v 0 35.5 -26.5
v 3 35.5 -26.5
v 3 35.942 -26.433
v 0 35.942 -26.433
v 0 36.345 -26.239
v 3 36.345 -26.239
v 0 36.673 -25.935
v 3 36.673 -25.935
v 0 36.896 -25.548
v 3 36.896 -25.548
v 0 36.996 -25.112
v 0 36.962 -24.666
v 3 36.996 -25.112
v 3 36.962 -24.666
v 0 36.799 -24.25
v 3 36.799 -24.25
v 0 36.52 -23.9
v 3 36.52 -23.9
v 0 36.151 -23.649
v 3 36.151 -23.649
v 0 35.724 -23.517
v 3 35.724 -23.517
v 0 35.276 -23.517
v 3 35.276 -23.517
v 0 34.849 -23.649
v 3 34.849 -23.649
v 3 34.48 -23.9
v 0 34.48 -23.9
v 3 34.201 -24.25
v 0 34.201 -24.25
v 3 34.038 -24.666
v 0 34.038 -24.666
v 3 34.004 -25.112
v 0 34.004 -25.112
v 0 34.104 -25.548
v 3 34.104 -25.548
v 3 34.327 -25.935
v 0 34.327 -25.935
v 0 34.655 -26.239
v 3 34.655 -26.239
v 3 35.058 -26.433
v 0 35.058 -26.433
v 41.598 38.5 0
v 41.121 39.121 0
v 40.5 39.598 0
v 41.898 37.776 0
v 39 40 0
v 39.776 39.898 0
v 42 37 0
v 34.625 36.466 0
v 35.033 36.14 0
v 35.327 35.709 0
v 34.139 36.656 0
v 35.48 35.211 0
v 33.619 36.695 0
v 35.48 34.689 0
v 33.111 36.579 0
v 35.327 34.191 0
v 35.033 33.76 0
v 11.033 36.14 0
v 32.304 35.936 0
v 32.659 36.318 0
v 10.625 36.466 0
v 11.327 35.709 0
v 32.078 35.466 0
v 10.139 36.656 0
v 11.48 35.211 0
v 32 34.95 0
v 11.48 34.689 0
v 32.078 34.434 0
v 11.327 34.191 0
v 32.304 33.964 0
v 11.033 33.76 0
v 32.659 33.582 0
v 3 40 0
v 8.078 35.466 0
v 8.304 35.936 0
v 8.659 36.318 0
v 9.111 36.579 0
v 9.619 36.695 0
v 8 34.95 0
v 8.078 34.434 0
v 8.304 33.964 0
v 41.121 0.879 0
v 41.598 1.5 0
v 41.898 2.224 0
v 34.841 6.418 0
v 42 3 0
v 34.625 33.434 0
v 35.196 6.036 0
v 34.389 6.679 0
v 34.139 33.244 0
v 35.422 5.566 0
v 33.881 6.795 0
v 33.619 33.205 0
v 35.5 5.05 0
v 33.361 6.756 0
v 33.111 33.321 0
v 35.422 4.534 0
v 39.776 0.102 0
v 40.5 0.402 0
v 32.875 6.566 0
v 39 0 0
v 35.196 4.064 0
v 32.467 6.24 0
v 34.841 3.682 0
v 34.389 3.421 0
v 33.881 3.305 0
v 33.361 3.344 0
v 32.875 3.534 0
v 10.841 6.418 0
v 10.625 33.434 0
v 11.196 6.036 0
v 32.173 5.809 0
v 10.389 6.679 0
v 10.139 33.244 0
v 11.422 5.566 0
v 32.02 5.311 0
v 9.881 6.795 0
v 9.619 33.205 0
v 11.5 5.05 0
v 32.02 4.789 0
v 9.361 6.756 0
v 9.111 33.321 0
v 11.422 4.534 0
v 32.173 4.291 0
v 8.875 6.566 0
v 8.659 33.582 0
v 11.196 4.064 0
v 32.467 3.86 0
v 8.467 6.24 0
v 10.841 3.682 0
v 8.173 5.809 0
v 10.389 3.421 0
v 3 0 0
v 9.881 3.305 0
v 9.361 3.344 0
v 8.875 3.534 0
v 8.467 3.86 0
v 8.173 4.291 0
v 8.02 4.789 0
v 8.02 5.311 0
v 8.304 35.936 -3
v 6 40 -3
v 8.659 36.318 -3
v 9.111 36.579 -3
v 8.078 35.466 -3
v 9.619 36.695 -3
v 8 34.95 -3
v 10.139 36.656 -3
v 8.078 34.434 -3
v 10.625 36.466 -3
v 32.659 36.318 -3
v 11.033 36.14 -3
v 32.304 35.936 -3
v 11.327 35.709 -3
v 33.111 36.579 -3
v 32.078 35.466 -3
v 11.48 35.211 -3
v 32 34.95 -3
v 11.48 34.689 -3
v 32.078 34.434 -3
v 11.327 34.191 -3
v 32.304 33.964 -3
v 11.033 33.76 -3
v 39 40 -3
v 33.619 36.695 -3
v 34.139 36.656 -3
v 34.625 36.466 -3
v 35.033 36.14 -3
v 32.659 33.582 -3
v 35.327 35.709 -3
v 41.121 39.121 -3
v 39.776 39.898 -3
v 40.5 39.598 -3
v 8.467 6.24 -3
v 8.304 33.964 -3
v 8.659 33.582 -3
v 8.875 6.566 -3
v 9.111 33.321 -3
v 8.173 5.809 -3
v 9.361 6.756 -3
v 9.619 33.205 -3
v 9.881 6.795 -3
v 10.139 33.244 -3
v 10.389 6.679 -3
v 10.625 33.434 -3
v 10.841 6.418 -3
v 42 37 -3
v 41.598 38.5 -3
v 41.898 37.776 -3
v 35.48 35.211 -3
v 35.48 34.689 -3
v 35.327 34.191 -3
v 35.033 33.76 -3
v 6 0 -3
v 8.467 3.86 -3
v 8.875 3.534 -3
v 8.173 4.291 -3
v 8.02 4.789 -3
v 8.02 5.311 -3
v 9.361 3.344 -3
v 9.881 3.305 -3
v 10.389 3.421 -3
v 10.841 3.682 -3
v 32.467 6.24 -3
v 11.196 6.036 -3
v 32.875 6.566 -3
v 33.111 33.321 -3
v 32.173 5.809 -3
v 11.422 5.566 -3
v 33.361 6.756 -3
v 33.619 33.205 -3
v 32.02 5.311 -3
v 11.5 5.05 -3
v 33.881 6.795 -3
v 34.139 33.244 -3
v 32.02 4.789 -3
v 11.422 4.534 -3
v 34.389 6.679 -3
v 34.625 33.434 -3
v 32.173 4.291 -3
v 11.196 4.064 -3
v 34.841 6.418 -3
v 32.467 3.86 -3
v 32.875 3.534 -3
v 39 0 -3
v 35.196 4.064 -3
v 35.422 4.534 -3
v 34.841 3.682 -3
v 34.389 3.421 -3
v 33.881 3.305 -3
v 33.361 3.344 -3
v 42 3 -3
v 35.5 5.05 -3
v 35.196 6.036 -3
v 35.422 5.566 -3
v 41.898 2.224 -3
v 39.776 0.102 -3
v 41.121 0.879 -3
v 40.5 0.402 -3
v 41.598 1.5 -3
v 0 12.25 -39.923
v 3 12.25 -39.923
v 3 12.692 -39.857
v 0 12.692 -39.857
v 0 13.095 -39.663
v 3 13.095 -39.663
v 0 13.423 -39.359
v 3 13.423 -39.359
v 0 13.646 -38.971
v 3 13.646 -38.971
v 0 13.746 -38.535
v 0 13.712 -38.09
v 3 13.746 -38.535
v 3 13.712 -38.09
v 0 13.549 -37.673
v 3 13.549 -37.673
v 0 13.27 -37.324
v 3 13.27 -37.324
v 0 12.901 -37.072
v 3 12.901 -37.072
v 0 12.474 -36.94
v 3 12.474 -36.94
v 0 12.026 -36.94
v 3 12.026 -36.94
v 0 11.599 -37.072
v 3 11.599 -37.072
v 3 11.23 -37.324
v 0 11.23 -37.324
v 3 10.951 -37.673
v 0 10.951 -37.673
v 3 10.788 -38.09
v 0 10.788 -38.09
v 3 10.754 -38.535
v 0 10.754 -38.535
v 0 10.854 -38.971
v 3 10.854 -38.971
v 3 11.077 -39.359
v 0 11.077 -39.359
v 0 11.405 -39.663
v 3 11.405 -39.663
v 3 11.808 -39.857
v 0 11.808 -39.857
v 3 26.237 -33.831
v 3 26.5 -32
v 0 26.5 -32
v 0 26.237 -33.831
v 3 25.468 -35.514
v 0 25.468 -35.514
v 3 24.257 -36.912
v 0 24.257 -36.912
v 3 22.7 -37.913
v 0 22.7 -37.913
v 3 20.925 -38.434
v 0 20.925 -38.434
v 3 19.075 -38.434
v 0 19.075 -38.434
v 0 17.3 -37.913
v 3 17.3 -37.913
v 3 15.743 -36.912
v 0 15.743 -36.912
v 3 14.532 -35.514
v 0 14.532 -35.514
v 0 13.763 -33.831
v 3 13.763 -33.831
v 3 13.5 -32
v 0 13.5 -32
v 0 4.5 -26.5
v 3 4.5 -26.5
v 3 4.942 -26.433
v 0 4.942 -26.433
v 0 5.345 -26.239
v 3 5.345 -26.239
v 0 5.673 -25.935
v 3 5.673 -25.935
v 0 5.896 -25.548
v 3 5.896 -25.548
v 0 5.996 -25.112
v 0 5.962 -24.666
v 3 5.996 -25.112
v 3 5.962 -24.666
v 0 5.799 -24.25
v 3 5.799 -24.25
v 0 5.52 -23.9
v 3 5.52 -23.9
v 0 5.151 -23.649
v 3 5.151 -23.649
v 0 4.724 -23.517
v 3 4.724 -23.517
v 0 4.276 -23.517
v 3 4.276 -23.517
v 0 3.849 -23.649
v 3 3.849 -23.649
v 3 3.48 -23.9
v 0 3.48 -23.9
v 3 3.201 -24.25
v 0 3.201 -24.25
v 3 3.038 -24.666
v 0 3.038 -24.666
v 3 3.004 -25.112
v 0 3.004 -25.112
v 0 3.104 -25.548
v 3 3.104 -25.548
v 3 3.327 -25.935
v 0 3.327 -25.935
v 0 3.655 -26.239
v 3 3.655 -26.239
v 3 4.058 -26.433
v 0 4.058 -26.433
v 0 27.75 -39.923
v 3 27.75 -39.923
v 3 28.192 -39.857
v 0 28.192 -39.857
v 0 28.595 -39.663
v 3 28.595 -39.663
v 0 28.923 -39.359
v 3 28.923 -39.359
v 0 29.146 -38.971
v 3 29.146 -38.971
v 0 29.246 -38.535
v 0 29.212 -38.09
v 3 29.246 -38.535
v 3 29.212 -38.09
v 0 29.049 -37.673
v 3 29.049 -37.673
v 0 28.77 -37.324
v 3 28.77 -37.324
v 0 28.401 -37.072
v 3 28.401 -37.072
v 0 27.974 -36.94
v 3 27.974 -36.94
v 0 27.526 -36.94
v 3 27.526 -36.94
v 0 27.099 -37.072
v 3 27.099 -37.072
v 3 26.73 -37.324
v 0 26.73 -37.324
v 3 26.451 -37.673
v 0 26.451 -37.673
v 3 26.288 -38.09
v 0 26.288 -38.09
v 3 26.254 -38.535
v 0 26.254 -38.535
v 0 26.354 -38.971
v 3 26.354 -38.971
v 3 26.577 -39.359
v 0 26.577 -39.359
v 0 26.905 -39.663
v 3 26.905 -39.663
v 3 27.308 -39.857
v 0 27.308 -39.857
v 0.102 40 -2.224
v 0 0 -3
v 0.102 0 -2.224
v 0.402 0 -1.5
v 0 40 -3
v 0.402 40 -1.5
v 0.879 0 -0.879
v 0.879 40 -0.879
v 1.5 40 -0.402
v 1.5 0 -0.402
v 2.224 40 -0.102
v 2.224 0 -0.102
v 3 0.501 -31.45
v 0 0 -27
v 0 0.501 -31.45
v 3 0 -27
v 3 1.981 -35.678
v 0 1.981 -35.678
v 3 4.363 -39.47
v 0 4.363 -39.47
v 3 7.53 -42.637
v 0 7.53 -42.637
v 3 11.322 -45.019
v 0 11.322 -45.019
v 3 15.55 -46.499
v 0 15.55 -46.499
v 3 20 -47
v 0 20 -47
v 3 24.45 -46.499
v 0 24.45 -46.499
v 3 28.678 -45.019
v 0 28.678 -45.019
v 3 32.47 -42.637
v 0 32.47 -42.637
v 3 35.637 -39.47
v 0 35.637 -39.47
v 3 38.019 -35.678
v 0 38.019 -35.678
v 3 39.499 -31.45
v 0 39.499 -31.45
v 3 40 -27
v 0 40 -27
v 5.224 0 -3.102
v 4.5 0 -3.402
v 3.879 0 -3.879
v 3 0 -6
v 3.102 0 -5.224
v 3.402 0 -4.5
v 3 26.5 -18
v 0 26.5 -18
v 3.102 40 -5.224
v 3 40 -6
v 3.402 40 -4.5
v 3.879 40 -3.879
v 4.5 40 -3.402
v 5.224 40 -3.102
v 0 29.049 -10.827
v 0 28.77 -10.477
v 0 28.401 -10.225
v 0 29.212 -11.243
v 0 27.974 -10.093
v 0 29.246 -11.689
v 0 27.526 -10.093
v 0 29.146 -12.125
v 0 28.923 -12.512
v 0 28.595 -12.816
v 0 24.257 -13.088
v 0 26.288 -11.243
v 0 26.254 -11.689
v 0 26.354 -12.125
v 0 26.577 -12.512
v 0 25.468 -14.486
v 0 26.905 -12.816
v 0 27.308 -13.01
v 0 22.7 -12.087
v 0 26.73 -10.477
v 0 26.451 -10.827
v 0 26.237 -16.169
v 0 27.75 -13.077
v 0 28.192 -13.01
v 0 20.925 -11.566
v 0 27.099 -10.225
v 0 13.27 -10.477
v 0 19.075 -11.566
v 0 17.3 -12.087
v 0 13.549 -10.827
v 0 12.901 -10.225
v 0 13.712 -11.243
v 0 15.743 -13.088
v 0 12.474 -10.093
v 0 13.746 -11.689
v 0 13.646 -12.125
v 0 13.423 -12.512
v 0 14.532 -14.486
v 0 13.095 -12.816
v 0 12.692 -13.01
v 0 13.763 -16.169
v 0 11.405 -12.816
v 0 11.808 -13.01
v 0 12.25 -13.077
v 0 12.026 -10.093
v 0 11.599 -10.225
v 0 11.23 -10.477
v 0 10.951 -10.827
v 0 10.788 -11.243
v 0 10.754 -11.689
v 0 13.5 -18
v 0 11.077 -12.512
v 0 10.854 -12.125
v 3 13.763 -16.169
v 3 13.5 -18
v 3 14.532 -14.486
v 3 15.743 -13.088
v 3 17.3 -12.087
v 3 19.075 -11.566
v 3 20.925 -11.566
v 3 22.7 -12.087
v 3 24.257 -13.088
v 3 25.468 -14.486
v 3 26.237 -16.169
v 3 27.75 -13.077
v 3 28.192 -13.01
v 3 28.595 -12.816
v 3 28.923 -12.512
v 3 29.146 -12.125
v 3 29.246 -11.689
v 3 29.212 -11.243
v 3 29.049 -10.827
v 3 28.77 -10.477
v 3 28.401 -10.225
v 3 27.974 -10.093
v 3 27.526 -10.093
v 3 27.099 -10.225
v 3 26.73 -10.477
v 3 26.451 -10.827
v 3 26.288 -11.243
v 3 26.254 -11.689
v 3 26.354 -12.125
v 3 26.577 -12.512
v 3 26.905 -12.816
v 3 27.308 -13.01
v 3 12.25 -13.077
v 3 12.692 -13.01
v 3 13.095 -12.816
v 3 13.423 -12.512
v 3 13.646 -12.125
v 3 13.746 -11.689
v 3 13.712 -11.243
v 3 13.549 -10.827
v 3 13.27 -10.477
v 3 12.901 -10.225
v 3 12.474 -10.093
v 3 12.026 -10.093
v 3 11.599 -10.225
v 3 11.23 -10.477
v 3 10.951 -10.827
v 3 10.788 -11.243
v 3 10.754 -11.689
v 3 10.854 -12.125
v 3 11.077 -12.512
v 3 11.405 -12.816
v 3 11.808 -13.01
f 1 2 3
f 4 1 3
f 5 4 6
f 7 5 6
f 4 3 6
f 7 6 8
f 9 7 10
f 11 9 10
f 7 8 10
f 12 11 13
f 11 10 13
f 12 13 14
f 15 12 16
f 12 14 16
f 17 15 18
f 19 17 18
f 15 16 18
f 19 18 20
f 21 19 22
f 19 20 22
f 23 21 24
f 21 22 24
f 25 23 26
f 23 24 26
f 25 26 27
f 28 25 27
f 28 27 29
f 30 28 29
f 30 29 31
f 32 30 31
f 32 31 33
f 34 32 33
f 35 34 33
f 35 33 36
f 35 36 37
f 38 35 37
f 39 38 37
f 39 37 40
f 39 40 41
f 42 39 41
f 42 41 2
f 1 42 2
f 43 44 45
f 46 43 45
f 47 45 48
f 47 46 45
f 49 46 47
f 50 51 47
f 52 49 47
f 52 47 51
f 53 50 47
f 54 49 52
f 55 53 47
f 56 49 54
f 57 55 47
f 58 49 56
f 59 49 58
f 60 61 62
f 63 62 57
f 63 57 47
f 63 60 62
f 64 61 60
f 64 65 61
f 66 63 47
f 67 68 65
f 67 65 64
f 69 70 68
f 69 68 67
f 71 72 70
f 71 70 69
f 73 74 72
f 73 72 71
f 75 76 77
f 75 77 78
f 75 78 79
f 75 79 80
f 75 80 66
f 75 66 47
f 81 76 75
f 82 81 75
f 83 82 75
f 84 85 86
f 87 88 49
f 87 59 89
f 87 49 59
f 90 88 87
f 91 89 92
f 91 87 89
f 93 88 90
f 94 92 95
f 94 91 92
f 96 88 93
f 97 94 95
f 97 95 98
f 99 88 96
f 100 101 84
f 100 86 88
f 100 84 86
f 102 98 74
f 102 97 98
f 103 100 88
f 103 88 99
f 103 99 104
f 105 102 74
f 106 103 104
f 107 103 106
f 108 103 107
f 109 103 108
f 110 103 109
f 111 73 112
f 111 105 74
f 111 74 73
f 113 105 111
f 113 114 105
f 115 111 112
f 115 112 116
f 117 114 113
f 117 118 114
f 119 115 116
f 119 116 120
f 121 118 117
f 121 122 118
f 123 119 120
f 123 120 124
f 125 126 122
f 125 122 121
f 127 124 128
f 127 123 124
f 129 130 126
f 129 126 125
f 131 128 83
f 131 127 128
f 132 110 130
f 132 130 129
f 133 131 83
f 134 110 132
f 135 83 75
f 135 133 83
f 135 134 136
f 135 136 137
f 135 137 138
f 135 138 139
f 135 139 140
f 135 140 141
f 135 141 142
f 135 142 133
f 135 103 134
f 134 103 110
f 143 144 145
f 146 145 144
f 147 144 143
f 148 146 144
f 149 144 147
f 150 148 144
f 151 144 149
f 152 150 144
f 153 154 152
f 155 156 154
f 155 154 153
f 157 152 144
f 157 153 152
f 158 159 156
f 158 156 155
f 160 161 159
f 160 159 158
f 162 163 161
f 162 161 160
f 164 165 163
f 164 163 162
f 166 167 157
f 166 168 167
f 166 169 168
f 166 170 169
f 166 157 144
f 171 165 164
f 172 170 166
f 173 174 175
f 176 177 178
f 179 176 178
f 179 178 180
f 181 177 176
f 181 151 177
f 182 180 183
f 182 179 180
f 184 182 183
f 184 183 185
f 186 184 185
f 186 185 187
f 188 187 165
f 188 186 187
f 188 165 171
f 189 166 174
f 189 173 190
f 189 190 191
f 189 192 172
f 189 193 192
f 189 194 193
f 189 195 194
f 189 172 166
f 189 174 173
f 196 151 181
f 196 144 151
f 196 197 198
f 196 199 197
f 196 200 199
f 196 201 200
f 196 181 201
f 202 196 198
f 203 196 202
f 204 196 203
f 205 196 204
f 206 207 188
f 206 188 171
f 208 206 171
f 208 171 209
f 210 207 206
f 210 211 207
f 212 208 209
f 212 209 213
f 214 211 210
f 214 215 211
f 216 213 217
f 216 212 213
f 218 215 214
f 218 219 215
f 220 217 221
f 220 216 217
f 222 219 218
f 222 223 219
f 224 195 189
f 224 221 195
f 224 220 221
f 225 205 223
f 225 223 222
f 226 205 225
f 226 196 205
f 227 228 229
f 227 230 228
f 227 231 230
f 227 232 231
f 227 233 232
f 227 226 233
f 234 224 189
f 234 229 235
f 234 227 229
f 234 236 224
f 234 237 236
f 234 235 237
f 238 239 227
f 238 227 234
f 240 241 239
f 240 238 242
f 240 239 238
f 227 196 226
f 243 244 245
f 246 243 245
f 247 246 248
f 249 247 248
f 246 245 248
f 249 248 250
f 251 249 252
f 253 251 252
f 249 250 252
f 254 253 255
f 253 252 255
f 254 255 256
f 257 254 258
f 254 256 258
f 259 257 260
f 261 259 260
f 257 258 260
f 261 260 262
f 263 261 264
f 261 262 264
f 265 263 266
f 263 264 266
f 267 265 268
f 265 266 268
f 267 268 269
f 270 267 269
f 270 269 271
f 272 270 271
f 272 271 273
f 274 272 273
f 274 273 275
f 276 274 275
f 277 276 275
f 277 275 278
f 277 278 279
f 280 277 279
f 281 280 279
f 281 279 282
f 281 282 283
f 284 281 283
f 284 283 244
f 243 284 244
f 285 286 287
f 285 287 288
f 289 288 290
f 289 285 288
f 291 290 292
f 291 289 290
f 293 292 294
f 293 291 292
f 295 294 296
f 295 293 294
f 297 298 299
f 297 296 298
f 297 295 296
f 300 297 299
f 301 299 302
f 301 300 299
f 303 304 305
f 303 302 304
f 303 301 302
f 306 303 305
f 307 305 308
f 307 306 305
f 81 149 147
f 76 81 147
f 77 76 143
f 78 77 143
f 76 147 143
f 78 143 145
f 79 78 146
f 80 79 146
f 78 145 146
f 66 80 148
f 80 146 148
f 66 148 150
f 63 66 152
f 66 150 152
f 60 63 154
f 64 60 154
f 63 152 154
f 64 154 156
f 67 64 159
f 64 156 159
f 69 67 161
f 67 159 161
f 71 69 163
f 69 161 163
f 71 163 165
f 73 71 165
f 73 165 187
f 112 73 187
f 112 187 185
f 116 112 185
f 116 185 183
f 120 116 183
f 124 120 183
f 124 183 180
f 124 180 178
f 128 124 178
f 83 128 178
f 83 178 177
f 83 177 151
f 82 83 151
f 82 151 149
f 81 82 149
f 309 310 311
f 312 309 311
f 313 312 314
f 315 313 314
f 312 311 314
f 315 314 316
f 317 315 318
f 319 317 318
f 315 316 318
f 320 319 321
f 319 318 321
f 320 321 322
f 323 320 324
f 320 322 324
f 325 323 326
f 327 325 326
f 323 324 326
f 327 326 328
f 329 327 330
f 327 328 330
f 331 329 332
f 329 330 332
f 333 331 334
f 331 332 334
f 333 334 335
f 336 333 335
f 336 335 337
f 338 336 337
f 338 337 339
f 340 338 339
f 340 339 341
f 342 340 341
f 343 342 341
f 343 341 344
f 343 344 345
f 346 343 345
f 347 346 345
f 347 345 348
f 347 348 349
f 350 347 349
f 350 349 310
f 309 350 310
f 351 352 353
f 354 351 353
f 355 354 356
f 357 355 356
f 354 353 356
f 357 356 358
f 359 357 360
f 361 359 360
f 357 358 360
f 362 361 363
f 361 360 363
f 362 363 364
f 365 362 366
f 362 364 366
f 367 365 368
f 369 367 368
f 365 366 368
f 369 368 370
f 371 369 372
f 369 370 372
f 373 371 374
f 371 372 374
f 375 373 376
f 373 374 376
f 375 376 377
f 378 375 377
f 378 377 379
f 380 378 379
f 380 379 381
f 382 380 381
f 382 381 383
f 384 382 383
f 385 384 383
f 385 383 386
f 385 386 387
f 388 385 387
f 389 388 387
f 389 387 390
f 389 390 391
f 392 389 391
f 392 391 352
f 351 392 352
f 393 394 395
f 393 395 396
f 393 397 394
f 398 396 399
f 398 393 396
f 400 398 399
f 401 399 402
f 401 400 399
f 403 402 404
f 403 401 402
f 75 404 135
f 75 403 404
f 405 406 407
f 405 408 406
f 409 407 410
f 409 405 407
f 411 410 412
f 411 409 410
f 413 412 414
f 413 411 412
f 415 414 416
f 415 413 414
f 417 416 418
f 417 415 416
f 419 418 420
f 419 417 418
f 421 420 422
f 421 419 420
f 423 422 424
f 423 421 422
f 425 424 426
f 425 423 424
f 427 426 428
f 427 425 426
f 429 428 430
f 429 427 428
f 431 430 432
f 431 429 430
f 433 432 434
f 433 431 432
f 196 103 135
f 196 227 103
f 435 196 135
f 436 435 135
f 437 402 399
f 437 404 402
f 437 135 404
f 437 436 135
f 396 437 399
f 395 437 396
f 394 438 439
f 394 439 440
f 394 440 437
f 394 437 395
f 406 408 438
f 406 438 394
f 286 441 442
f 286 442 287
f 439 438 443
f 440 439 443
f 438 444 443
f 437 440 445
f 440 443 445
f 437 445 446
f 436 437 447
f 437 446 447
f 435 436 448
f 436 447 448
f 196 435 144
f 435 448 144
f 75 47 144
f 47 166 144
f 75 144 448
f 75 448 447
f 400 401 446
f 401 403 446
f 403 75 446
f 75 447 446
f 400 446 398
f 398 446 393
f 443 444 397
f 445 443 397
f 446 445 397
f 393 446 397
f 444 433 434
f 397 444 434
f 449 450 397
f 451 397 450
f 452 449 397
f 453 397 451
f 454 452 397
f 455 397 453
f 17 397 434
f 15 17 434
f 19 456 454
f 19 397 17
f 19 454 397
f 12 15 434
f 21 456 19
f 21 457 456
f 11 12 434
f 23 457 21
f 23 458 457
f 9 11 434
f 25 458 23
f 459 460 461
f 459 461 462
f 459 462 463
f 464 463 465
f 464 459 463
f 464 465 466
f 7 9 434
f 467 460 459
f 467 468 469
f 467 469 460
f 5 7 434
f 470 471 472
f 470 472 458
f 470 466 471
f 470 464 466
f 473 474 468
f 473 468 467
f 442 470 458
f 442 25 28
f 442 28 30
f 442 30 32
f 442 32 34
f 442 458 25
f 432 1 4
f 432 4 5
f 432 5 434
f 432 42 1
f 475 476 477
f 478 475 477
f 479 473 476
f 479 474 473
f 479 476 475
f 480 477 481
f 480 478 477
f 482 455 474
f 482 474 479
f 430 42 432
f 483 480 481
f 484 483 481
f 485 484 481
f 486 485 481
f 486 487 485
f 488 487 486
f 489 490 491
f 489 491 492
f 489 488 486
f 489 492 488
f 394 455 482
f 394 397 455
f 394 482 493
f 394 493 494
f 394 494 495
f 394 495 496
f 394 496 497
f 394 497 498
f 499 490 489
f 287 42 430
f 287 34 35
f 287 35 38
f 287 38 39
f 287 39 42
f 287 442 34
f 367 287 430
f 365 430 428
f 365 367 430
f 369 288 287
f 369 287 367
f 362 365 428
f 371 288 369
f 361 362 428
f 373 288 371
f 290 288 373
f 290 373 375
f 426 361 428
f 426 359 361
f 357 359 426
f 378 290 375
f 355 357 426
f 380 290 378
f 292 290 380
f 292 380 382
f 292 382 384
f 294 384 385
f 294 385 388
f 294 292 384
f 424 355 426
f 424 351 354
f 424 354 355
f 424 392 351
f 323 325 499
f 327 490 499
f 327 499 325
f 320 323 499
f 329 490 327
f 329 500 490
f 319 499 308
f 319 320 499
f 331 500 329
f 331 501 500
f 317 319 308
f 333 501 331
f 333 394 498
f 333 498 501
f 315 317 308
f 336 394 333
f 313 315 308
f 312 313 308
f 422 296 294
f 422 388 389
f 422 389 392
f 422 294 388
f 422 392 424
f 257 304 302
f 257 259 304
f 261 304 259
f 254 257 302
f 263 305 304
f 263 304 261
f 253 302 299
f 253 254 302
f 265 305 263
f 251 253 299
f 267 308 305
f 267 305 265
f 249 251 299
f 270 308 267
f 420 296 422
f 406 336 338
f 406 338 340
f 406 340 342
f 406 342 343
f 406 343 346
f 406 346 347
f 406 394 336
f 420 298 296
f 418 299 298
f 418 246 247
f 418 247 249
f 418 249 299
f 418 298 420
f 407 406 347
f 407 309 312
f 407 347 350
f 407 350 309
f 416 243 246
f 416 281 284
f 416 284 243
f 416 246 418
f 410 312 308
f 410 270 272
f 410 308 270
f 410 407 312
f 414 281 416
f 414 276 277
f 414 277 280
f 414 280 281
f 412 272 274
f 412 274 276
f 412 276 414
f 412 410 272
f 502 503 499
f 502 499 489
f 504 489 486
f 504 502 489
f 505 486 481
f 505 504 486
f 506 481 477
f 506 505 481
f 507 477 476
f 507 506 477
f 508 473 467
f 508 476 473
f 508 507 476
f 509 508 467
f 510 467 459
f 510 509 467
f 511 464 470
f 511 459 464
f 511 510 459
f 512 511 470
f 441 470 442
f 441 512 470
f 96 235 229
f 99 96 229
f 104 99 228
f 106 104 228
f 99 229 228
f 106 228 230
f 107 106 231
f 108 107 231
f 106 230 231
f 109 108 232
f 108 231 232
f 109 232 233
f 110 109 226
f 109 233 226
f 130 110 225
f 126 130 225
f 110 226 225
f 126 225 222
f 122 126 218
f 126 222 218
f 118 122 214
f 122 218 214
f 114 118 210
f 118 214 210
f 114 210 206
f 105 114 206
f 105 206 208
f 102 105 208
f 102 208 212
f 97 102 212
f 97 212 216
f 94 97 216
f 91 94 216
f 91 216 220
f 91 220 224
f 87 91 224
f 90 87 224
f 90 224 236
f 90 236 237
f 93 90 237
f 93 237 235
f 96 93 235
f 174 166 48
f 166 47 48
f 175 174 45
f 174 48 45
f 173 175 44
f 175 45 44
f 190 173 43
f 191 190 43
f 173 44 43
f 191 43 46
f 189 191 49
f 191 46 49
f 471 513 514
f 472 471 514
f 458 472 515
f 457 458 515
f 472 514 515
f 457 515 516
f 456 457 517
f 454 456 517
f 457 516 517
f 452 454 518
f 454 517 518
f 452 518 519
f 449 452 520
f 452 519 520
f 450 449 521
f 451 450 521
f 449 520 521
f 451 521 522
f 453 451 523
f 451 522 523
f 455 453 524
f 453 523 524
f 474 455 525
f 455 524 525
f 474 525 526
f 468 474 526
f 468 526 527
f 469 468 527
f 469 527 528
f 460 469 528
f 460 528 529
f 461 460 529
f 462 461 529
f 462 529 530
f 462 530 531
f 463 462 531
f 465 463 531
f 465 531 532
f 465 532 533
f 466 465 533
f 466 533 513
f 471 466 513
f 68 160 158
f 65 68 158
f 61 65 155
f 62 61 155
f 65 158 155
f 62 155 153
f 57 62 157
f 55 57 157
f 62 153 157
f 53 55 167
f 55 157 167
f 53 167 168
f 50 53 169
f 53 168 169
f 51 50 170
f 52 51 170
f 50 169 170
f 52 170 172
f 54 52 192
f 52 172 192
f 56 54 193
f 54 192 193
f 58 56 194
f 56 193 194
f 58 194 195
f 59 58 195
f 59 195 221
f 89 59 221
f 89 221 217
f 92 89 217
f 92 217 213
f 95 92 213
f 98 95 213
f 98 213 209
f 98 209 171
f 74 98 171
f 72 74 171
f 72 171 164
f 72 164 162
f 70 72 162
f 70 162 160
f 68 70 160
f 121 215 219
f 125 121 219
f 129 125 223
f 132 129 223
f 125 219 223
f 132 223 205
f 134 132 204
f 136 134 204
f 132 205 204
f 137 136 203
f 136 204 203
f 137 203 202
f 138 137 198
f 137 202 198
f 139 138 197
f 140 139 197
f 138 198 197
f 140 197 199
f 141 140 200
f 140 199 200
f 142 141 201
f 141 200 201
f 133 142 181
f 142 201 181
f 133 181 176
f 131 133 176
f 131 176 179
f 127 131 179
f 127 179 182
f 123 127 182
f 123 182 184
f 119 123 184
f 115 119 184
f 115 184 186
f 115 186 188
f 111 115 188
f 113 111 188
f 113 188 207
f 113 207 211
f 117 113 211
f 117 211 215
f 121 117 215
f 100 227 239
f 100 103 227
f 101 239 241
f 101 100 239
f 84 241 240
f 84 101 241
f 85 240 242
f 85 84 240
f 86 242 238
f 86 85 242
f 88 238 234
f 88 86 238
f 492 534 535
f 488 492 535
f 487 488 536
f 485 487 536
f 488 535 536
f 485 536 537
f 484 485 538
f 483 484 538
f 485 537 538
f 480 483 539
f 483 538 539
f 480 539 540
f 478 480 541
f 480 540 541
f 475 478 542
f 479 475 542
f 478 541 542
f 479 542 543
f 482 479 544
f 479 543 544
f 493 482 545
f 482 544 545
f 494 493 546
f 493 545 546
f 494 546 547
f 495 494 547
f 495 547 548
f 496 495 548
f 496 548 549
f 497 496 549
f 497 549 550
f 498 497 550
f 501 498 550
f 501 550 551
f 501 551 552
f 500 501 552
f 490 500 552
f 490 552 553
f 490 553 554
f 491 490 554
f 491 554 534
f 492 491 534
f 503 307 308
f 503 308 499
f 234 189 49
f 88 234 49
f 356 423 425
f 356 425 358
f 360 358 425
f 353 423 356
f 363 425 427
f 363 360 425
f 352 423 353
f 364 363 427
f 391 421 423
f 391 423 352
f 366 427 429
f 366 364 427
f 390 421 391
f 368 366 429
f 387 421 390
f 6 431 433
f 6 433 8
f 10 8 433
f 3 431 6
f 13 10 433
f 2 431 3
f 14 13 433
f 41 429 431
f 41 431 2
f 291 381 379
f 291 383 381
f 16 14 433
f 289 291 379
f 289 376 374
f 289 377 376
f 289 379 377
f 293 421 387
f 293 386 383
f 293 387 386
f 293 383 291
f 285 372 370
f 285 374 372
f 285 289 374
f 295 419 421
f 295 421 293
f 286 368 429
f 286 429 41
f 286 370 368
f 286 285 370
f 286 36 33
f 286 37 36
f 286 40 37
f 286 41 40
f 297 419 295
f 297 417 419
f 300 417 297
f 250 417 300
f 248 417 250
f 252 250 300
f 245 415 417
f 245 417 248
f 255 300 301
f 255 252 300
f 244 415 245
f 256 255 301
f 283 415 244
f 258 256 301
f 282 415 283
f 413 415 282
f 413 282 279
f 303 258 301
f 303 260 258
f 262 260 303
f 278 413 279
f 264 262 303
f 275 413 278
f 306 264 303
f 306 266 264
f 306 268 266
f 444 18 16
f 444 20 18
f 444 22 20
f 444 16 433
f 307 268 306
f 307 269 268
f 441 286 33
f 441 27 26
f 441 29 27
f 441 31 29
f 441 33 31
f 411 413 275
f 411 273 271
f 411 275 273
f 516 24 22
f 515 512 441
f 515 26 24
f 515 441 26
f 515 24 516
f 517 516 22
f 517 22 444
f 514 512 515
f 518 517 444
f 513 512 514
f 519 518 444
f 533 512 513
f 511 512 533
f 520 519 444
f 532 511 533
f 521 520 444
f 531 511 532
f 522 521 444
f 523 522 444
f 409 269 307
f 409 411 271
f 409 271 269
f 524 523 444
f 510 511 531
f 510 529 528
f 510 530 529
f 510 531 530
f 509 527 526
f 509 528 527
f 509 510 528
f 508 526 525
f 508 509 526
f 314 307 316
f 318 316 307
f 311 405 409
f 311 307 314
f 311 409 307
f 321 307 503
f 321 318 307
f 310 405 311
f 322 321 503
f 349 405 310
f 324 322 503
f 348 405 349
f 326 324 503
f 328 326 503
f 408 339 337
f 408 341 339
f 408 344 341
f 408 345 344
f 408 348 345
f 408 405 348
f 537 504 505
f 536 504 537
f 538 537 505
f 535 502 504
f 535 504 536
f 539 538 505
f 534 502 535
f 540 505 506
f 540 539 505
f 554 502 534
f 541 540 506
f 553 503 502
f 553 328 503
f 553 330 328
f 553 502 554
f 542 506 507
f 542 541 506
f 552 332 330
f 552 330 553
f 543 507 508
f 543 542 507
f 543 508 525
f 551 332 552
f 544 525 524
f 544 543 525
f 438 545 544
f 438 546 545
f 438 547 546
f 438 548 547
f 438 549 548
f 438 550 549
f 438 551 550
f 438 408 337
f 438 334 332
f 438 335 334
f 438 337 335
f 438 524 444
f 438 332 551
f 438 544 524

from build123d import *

# Parameters (mm, degrees)
ESTRUSIONE_ESTRUSIONE1_DEPTH = 40
SCHIZZO2_R                   = 1.5
TAGLIO_ESTRUSIONE1_DEPTH     = 74.006848994
RACCORDO1_R                  = 3
RACCORDO2_R                  = 20
SCHIZZO3_R                   = 1.75
TAGLIO_ESTRUSIONE2_DEPTH     = 73.801098893
RACCORDO3_R                  = 3


with BuildPart() as part:
    # Schizzo1 → Estrusione-Estrusione1 (new body)
    with BuildSketch(Plane(origin=(0, 0, 0), x_dir=(1, 0, 0), z_dir=(0, 1, 0))):
        Polygon((0, 0), (0, 47), (3, 47), (3, 3), (42, 3), (42, 0), align=None)
    extrude(amount=ESTRUSIONE_ESTRUSIONE1_DEPTH)

    # Schizzo2 → Taglio-Estrusione1 (cut, through all)
    with BuildSketch(Plane(origin=(3, 0, 0), x_dir=(0, 0, -1), z_dir=(1, 0, 0))):
        with Locations((25, 4.5)):
            Circle(SCHIZZO2_R)
        with Locations((11.576606241, 12.25)):
            Circle(SCHIZZO2_R)
        with Locations((11.576606241, 27.75)):
            Circle(SCHIZZO2_R)
        with Locations((25, 35.5)):
            Circle(SCHIZZO2_R)
        with Locations((38.423393759, 27.75)):
            Circle(SCHIZZO2_R)
        with Locations((38.423393759, 12.25)):
            Circle(SCHIZZO2_R)
        with BuildLine():
            Line((18, 26.5), (32, 26.5))
            ThreePointArc((32, 26.5), (38.5, 20), (32, 13.5))
            Line((32, 13.5), (18, 13.5))
            ThreePointArc((18, 13.5), (11.5, 20), (18, 26.5))
        make_face()
    extrude(amount=-TAGLIO_ESTRUSIONE1_DEPTH, mode=Mode.SUBTRACT)

    # Raccordo1
    raccordo1_edges = [part.edges().sort_by_distance(p)[0] for p in [
        (0, 20, 0),
        (3, 20, -3),
    ]]
    fillet(raccordo1_edges, radius=RACCORDO1_R)

    # Raccordo2
    raccordo2_edges = [part.edges().sort_by_distance(p)[0] for p in [
        (1.5, 0, -47),
        (1.5, 40, -47),
    ]]
    fillet(raccordo2_edges, radius=RACCORDO2_R - 0.0001)  # a hair under: the kernel refuses the full size

    # Schizzo3 → Taglio-Estrusione2 (cut, through all)
    with BuildSketch(Plane(origin=(0, 0, -3), x_dir=(-1, 0, 0), z_dir=(0, 0, -1))):
        with Locations((-33.75, 34.95)):
            Circle(SCHIZZO3_R)
        with Locations((-9.75, 34.95)):
            Circle(SCHIZZO3_R)
        with Locations(Location((-9.75, 5.05, 0), (0, 0, 180))):
            Circle(SCHIZZO3_R)
        with Locations(Location((-33.75, 5.05, 0), (0, 0, 180))):
            Circle(SCHIZZO3_R)
    extrude(amount=-TAGLIO_ESTRUSIONE2_DEPTH, mode=Mode.SUBTRACT)

    # Raccordo3
    raccordo3_edges = [part.edges().sort_by_distance(p)[0] for p in [
        (42, 0, -1.5),
        (42, 40, -1.5),
    ]]
    fillet(raccordo3_edges, radius=RACCORDO3_R)


solid = part.part
